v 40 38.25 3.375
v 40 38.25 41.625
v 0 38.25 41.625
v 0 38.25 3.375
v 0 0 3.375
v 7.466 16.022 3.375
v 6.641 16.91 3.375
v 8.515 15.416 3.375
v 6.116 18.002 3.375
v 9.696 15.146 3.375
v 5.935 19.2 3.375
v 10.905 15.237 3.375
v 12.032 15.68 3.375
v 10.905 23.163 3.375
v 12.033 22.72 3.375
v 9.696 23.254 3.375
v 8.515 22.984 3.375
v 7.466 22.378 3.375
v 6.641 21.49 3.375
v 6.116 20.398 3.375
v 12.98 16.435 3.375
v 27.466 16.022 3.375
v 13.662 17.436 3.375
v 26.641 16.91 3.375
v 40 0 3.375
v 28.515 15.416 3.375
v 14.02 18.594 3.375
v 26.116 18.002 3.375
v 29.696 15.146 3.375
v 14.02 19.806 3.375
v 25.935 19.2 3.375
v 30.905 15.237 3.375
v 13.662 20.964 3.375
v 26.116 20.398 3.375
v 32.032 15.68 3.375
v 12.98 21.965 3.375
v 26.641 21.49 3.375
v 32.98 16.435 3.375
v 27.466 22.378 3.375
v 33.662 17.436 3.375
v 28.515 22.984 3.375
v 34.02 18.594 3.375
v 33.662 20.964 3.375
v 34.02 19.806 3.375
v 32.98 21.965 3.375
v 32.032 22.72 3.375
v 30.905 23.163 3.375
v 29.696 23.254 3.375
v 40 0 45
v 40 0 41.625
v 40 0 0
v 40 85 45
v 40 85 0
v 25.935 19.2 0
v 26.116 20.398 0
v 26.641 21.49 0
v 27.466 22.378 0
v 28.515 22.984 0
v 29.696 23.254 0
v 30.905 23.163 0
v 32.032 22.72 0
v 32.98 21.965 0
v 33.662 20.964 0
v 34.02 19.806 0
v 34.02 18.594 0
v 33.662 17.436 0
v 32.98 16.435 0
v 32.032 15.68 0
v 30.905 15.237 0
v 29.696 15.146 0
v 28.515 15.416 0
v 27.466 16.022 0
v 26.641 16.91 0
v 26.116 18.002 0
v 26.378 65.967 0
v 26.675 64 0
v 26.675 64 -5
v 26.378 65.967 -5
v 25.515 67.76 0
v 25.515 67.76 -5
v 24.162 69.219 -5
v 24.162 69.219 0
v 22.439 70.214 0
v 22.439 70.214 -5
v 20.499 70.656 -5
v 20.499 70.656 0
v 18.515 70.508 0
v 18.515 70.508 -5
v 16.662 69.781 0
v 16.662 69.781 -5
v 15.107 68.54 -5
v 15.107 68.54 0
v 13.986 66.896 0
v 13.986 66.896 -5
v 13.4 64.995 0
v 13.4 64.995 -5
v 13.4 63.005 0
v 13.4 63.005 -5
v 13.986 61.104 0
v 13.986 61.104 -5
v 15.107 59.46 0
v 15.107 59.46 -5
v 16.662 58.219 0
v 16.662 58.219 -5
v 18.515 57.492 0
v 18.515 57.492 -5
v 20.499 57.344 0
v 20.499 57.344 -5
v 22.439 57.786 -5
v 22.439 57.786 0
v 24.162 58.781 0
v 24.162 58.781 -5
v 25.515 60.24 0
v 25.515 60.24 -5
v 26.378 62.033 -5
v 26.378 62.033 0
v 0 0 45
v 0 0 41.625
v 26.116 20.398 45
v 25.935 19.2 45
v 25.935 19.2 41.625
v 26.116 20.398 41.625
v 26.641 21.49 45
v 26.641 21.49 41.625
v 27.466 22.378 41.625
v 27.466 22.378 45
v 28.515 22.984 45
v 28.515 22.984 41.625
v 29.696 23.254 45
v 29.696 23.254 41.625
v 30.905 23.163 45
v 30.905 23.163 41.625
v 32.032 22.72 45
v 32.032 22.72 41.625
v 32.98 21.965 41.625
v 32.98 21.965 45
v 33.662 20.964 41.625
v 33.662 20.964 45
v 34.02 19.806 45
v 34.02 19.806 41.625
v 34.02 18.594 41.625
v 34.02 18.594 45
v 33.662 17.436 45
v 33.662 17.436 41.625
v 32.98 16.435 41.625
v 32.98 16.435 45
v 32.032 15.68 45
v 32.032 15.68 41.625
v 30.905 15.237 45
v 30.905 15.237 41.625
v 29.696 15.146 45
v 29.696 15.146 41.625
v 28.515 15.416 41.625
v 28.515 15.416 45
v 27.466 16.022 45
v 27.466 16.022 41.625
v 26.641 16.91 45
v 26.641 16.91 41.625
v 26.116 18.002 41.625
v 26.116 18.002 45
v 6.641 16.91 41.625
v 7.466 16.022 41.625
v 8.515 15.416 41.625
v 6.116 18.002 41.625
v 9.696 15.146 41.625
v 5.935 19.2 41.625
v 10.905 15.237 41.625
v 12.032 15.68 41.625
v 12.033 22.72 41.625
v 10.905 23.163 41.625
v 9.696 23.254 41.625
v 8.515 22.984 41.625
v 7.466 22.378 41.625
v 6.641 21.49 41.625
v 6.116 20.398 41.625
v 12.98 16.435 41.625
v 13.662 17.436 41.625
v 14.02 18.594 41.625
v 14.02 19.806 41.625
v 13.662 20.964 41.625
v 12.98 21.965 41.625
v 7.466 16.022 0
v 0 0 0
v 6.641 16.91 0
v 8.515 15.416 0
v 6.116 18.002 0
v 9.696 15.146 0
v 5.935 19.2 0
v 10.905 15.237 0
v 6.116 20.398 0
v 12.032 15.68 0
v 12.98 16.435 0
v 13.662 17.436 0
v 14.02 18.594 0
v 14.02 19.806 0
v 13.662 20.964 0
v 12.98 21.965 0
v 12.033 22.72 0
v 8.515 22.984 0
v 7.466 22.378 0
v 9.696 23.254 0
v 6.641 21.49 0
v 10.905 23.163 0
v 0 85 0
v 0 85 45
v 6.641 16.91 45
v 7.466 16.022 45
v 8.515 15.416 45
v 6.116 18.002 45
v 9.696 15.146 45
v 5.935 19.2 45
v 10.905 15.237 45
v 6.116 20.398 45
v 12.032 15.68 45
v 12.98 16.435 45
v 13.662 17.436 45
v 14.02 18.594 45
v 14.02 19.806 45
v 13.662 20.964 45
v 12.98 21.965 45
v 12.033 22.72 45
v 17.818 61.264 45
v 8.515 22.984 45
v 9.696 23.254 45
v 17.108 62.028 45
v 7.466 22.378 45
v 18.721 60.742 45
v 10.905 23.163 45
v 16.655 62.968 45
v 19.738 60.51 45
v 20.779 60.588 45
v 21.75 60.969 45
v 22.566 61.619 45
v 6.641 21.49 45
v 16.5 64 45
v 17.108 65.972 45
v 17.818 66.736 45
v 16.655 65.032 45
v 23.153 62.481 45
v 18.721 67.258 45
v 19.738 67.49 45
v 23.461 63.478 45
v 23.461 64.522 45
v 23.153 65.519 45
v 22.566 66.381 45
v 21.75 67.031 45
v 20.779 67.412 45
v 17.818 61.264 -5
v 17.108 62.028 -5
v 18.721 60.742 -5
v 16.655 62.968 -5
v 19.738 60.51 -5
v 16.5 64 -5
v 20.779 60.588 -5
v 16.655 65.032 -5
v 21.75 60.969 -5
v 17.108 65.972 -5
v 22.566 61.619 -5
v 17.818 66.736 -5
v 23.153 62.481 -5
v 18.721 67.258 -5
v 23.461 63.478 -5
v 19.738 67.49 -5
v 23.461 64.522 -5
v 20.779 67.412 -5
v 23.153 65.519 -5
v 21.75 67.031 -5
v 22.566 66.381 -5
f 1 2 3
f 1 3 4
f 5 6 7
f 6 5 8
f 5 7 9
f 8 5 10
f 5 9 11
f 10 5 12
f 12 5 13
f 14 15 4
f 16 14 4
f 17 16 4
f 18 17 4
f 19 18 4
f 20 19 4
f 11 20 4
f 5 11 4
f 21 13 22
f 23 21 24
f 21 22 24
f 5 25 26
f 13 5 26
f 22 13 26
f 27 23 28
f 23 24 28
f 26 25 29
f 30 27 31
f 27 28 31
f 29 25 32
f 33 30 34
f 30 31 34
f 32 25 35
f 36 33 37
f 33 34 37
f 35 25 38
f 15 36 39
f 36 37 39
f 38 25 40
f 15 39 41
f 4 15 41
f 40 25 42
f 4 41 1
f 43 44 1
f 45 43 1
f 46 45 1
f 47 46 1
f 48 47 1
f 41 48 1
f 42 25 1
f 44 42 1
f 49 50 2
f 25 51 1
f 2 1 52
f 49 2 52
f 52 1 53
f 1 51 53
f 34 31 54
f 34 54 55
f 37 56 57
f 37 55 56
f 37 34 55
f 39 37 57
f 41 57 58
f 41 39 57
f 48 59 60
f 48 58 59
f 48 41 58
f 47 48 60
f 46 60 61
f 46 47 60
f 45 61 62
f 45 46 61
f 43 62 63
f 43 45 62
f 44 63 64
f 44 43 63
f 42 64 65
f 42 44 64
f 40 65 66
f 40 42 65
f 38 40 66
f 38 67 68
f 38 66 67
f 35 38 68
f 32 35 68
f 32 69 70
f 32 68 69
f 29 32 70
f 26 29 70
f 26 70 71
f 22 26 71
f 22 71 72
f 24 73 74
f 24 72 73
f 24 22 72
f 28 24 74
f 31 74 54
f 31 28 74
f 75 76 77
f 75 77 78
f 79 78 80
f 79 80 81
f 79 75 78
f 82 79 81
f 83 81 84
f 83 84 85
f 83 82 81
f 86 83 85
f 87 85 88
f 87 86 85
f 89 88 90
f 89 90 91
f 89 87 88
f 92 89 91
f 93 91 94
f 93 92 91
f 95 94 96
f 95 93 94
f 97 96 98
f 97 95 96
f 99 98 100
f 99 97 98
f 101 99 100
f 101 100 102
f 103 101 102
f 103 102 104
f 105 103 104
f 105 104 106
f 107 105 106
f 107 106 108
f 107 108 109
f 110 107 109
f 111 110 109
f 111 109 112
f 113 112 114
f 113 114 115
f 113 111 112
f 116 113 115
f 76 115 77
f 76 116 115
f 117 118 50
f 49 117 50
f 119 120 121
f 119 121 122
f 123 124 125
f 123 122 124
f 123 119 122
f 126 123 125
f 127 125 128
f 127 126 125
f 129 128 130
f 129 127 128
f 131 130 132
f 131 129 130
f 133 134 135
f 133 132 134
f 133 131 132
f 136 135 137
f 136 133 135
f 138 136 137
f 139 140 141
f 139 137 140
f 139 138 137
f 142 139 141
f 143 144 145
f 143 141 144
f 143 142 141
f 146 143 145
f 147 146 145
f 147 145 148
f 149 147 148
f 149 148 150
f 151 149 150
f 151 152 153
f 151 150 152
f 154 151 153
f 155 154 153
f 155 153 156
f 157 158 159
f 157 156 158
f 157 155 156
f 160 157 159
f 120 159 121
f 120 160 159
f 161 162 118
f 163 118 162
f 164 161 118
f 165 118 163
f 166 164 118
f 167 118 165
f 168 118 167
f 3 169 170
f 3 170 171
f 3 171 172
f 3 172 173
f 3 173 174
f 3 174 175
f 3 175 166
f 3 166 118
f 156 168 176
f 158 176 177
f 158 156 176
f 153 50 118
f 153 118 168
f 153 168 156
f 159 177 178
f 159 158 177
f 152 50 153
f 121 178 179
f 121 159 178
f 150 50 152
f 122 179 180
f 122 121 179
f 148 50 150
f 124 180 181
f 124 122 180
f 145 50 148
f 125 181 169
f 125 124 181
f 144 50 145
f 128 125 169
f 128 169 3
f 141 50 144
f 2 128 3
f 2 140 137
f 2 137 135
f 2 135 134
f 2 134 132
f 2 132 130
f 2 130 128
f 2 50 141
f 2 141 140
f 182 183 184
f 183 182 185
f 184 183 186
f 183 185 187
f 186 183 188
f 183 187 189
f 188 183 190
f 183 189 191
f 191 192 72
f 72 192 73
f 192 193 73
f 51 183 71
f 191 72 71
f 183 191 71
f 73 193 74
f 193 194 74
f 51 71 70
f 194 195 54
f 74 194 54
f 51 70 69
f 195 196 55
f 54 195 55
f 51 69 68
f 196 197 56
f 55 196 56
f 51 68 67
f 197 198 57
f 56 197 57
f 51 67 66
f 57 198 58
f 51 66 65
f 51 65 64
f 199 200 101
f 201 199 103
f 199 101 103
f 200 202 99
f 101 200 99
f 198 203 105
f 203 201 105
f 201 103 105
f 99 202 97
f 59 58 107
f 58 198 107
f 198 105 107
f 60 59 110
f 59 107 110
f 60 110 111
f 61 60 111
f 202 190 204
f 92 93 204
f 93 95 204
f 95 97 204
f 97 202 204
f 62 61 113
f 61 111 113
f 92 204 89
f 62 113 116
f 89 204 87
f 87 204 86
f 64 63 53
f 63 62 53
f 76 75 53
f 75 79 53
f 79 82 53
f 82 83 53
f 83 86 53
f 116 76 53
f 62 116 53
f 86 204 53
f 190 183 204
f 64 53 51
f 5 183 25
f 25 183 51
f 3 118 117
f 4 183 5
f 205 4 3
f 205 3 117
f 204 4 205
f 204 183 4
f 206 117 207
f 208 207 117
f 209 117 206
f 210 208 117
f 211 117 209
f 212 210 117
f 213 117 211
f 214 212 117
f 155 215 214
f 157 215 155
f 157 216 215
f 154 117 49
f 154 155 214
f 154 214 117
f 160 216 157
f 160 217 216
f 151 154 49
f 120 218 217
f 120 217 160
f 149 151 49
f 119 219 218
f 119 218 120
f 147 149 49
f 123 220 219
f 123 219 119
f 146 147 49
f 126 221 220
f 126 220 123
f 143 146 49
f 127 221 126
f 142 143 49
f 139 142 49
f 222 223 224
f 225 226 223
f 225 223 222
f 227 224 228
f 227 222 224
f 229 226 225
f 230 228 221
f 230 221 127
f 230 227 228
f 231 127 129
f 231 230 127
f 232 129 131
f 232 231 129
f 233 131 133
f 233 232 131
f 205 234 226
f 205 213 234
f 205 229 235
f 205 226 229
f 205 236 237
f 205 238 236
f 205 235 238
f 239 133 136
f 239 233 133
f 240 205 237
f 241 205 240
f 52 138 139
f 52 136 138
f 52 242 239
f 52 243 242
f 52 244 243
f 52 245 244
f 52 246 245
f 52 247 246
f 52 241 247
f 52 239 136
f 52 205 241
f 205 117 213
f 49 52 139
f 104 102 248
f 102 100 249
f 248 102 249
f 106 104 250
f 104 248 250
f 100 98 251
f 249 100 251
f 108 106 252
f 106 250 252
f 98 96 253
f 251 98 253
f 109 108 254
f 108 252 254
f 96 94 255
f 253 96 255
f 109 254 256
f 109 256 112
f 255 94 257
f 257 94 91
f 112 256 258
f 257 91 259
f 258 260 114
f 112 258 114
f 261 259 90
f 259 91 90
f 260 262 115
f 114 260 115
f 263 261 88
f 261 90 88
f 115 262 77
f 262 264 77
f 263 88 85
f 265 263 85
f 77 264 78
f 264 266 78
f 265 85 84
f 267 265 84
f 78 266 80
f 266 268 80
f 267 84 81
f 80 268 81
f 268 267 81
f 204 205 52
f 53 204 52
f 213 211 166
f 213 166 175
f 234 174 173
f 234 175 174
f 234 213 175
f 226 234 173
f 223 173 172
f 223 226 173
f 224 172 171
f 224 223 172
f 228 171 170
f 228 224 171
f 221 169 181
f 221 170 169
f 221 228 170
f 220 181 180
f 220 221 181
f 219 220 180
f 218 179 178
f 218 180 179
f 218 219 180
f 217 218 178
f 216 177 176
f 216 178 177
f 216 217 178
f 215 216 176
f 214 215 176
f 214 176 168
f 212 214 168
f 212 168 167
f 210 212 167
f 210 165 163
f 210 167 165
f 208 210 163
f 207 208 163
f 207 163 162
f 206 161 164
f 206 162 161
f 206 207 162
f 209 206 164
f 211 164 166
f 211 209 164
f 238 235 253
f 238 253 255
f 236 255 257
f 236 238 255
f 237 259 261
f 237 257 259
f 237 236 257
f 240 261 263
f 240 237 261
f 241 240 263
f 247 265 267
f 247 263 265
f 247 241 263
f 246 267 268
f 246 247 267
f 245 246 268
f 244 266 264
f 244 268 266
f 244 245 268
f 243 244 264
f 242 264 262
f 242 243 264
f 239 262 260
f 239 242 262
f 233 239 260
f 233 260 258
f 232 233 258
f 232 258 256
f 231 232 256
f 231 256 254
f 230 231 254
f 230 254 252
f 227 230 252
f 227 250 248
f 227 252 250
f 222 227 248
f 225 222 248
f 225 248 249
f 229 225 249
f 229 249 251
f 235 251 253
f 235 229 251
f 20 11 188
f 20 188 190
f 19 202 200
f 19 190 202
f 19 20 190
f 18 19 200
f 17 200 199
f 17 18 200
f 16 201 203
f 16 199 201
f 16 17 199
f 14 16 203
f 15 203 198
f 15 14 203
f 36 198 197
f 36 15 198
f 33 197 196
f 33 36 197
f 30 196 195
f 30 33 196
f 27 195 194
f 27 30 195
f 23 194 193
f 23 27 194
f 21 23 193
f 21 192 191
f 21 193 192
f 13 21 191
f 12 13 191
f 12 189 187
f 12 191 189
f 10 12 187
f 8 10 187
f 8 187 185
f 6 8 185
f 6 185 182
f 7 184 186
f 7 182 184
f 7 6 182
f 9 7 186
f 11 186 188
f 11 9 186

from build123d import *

# Parameters (mm, degrees)
ESQUISSE1_W                  = 40
ESQUISSE1_H                  = 85
BOSS_EXTRU_1_DEPTH           = 45
ESQUISSE2_W                  = 38.25
ESQUISSE2_H                  = 38.25
ENL_V_MAT_EXTRU_1_DEPTH      = 105.16333328
ENL_V_MAT_EXTRU_2_DEPTH      = 103.75038017
ENL_V_MAT_EXTRU_2_DEPTH_BACK = 103.75038017
ESQUISSE3_R                  = 4.065
ESQUISSE6_R                  = 6.675
BOSS_EXTRU_2_DEPTH           = 5
ENL_V_MAT_EXTRU_4_DEPTH      = 105.16333328
ENL_V_MAT_EXTRU_4_DEPTH_BACK = 105.16333328
ESQUISSE4_R                  = 3.5


with BuildPart() as part:
    # Esquisse1 → Boss.-Extru.1 (new body)
    with BuildSketch(Plane.XY):
        with Locations((20, 42.5)):
            Rectangle(ESQUISSE1_W, ESQUISSE1_H)
    extrude(amount=BOSS_EXTRU_1_DEPTH)

    # Esquisse2 → Enlèv. mat.-Extru.1 (cut, through all)
    with BuildSketch(Plane(origin=(40, 0, 0), x_dir=(0, 0, -1), z_dir=(1, 0, 0))):
        with Locations((-22.5, 19.125)):
            Rectangle(ESQUISSE2_W, ESQUISSE2_H)
    extrude(amount=-ENL_V_MAT_EXTRU_1_DEPTH, mode=Mode.SUBTRACT)

    # Esquisse3 → Enlèv. mat.-Extru.2 (cut, two sides: drawn at the far end of the back side and taken through both)
    with BuildSketch(Plane(origin=(0, 0, 41.625), x_dir=(-1, 0, 0), z_dir=(0, 0, -1)).offset(-ENL_V_MAT_EXTRU_2_DEPTH_BACK)):
        with Locations((-30, 19.2)):
            Circle(ESQUISSE3_R)
        with Locations((-10, 19.2)):
            Circle(ESQUISSE3_R)
    extrude(amount=ENL_V_MAT_EXTRU_2_DEPTH + ENL_V_MAT_EXTRU_2_DEPTH_BACK, mode=Mode.SUBTRACT)

    # Esquisse6 → Boss.-Extru.2 (add)
    with BuildSketch(Plane.XY):
        with Locations((20, 64)):
            Circle(ESQUISSE6_R)
    extrude(amount=-BOSS_EXTRU_2_DEPTH)

    # Esquisse4 → Enlèv. mat.-Extru.4 (cut, two sides: drawn at the far end of the back side and taken through both)
    with BuildSketch(Plane(origin=(0, 0, 0), x_dir=(-1, 0, 0), z_dir=(0, 0, -1)).offset(-ENL_V_MAT_EXTRU_4_DEPTH_BACK)):
        with Locations((-20, 64)):
            Circle(ESQUISSE4_R)
    extrude(amount=ENL_V_MAT_EXTRU_4_DEPTH + ENL_V_MAT_EXTRU_4_DEPTH_BACK, mode=Mode.SUBTRACT)


solid = part.part
